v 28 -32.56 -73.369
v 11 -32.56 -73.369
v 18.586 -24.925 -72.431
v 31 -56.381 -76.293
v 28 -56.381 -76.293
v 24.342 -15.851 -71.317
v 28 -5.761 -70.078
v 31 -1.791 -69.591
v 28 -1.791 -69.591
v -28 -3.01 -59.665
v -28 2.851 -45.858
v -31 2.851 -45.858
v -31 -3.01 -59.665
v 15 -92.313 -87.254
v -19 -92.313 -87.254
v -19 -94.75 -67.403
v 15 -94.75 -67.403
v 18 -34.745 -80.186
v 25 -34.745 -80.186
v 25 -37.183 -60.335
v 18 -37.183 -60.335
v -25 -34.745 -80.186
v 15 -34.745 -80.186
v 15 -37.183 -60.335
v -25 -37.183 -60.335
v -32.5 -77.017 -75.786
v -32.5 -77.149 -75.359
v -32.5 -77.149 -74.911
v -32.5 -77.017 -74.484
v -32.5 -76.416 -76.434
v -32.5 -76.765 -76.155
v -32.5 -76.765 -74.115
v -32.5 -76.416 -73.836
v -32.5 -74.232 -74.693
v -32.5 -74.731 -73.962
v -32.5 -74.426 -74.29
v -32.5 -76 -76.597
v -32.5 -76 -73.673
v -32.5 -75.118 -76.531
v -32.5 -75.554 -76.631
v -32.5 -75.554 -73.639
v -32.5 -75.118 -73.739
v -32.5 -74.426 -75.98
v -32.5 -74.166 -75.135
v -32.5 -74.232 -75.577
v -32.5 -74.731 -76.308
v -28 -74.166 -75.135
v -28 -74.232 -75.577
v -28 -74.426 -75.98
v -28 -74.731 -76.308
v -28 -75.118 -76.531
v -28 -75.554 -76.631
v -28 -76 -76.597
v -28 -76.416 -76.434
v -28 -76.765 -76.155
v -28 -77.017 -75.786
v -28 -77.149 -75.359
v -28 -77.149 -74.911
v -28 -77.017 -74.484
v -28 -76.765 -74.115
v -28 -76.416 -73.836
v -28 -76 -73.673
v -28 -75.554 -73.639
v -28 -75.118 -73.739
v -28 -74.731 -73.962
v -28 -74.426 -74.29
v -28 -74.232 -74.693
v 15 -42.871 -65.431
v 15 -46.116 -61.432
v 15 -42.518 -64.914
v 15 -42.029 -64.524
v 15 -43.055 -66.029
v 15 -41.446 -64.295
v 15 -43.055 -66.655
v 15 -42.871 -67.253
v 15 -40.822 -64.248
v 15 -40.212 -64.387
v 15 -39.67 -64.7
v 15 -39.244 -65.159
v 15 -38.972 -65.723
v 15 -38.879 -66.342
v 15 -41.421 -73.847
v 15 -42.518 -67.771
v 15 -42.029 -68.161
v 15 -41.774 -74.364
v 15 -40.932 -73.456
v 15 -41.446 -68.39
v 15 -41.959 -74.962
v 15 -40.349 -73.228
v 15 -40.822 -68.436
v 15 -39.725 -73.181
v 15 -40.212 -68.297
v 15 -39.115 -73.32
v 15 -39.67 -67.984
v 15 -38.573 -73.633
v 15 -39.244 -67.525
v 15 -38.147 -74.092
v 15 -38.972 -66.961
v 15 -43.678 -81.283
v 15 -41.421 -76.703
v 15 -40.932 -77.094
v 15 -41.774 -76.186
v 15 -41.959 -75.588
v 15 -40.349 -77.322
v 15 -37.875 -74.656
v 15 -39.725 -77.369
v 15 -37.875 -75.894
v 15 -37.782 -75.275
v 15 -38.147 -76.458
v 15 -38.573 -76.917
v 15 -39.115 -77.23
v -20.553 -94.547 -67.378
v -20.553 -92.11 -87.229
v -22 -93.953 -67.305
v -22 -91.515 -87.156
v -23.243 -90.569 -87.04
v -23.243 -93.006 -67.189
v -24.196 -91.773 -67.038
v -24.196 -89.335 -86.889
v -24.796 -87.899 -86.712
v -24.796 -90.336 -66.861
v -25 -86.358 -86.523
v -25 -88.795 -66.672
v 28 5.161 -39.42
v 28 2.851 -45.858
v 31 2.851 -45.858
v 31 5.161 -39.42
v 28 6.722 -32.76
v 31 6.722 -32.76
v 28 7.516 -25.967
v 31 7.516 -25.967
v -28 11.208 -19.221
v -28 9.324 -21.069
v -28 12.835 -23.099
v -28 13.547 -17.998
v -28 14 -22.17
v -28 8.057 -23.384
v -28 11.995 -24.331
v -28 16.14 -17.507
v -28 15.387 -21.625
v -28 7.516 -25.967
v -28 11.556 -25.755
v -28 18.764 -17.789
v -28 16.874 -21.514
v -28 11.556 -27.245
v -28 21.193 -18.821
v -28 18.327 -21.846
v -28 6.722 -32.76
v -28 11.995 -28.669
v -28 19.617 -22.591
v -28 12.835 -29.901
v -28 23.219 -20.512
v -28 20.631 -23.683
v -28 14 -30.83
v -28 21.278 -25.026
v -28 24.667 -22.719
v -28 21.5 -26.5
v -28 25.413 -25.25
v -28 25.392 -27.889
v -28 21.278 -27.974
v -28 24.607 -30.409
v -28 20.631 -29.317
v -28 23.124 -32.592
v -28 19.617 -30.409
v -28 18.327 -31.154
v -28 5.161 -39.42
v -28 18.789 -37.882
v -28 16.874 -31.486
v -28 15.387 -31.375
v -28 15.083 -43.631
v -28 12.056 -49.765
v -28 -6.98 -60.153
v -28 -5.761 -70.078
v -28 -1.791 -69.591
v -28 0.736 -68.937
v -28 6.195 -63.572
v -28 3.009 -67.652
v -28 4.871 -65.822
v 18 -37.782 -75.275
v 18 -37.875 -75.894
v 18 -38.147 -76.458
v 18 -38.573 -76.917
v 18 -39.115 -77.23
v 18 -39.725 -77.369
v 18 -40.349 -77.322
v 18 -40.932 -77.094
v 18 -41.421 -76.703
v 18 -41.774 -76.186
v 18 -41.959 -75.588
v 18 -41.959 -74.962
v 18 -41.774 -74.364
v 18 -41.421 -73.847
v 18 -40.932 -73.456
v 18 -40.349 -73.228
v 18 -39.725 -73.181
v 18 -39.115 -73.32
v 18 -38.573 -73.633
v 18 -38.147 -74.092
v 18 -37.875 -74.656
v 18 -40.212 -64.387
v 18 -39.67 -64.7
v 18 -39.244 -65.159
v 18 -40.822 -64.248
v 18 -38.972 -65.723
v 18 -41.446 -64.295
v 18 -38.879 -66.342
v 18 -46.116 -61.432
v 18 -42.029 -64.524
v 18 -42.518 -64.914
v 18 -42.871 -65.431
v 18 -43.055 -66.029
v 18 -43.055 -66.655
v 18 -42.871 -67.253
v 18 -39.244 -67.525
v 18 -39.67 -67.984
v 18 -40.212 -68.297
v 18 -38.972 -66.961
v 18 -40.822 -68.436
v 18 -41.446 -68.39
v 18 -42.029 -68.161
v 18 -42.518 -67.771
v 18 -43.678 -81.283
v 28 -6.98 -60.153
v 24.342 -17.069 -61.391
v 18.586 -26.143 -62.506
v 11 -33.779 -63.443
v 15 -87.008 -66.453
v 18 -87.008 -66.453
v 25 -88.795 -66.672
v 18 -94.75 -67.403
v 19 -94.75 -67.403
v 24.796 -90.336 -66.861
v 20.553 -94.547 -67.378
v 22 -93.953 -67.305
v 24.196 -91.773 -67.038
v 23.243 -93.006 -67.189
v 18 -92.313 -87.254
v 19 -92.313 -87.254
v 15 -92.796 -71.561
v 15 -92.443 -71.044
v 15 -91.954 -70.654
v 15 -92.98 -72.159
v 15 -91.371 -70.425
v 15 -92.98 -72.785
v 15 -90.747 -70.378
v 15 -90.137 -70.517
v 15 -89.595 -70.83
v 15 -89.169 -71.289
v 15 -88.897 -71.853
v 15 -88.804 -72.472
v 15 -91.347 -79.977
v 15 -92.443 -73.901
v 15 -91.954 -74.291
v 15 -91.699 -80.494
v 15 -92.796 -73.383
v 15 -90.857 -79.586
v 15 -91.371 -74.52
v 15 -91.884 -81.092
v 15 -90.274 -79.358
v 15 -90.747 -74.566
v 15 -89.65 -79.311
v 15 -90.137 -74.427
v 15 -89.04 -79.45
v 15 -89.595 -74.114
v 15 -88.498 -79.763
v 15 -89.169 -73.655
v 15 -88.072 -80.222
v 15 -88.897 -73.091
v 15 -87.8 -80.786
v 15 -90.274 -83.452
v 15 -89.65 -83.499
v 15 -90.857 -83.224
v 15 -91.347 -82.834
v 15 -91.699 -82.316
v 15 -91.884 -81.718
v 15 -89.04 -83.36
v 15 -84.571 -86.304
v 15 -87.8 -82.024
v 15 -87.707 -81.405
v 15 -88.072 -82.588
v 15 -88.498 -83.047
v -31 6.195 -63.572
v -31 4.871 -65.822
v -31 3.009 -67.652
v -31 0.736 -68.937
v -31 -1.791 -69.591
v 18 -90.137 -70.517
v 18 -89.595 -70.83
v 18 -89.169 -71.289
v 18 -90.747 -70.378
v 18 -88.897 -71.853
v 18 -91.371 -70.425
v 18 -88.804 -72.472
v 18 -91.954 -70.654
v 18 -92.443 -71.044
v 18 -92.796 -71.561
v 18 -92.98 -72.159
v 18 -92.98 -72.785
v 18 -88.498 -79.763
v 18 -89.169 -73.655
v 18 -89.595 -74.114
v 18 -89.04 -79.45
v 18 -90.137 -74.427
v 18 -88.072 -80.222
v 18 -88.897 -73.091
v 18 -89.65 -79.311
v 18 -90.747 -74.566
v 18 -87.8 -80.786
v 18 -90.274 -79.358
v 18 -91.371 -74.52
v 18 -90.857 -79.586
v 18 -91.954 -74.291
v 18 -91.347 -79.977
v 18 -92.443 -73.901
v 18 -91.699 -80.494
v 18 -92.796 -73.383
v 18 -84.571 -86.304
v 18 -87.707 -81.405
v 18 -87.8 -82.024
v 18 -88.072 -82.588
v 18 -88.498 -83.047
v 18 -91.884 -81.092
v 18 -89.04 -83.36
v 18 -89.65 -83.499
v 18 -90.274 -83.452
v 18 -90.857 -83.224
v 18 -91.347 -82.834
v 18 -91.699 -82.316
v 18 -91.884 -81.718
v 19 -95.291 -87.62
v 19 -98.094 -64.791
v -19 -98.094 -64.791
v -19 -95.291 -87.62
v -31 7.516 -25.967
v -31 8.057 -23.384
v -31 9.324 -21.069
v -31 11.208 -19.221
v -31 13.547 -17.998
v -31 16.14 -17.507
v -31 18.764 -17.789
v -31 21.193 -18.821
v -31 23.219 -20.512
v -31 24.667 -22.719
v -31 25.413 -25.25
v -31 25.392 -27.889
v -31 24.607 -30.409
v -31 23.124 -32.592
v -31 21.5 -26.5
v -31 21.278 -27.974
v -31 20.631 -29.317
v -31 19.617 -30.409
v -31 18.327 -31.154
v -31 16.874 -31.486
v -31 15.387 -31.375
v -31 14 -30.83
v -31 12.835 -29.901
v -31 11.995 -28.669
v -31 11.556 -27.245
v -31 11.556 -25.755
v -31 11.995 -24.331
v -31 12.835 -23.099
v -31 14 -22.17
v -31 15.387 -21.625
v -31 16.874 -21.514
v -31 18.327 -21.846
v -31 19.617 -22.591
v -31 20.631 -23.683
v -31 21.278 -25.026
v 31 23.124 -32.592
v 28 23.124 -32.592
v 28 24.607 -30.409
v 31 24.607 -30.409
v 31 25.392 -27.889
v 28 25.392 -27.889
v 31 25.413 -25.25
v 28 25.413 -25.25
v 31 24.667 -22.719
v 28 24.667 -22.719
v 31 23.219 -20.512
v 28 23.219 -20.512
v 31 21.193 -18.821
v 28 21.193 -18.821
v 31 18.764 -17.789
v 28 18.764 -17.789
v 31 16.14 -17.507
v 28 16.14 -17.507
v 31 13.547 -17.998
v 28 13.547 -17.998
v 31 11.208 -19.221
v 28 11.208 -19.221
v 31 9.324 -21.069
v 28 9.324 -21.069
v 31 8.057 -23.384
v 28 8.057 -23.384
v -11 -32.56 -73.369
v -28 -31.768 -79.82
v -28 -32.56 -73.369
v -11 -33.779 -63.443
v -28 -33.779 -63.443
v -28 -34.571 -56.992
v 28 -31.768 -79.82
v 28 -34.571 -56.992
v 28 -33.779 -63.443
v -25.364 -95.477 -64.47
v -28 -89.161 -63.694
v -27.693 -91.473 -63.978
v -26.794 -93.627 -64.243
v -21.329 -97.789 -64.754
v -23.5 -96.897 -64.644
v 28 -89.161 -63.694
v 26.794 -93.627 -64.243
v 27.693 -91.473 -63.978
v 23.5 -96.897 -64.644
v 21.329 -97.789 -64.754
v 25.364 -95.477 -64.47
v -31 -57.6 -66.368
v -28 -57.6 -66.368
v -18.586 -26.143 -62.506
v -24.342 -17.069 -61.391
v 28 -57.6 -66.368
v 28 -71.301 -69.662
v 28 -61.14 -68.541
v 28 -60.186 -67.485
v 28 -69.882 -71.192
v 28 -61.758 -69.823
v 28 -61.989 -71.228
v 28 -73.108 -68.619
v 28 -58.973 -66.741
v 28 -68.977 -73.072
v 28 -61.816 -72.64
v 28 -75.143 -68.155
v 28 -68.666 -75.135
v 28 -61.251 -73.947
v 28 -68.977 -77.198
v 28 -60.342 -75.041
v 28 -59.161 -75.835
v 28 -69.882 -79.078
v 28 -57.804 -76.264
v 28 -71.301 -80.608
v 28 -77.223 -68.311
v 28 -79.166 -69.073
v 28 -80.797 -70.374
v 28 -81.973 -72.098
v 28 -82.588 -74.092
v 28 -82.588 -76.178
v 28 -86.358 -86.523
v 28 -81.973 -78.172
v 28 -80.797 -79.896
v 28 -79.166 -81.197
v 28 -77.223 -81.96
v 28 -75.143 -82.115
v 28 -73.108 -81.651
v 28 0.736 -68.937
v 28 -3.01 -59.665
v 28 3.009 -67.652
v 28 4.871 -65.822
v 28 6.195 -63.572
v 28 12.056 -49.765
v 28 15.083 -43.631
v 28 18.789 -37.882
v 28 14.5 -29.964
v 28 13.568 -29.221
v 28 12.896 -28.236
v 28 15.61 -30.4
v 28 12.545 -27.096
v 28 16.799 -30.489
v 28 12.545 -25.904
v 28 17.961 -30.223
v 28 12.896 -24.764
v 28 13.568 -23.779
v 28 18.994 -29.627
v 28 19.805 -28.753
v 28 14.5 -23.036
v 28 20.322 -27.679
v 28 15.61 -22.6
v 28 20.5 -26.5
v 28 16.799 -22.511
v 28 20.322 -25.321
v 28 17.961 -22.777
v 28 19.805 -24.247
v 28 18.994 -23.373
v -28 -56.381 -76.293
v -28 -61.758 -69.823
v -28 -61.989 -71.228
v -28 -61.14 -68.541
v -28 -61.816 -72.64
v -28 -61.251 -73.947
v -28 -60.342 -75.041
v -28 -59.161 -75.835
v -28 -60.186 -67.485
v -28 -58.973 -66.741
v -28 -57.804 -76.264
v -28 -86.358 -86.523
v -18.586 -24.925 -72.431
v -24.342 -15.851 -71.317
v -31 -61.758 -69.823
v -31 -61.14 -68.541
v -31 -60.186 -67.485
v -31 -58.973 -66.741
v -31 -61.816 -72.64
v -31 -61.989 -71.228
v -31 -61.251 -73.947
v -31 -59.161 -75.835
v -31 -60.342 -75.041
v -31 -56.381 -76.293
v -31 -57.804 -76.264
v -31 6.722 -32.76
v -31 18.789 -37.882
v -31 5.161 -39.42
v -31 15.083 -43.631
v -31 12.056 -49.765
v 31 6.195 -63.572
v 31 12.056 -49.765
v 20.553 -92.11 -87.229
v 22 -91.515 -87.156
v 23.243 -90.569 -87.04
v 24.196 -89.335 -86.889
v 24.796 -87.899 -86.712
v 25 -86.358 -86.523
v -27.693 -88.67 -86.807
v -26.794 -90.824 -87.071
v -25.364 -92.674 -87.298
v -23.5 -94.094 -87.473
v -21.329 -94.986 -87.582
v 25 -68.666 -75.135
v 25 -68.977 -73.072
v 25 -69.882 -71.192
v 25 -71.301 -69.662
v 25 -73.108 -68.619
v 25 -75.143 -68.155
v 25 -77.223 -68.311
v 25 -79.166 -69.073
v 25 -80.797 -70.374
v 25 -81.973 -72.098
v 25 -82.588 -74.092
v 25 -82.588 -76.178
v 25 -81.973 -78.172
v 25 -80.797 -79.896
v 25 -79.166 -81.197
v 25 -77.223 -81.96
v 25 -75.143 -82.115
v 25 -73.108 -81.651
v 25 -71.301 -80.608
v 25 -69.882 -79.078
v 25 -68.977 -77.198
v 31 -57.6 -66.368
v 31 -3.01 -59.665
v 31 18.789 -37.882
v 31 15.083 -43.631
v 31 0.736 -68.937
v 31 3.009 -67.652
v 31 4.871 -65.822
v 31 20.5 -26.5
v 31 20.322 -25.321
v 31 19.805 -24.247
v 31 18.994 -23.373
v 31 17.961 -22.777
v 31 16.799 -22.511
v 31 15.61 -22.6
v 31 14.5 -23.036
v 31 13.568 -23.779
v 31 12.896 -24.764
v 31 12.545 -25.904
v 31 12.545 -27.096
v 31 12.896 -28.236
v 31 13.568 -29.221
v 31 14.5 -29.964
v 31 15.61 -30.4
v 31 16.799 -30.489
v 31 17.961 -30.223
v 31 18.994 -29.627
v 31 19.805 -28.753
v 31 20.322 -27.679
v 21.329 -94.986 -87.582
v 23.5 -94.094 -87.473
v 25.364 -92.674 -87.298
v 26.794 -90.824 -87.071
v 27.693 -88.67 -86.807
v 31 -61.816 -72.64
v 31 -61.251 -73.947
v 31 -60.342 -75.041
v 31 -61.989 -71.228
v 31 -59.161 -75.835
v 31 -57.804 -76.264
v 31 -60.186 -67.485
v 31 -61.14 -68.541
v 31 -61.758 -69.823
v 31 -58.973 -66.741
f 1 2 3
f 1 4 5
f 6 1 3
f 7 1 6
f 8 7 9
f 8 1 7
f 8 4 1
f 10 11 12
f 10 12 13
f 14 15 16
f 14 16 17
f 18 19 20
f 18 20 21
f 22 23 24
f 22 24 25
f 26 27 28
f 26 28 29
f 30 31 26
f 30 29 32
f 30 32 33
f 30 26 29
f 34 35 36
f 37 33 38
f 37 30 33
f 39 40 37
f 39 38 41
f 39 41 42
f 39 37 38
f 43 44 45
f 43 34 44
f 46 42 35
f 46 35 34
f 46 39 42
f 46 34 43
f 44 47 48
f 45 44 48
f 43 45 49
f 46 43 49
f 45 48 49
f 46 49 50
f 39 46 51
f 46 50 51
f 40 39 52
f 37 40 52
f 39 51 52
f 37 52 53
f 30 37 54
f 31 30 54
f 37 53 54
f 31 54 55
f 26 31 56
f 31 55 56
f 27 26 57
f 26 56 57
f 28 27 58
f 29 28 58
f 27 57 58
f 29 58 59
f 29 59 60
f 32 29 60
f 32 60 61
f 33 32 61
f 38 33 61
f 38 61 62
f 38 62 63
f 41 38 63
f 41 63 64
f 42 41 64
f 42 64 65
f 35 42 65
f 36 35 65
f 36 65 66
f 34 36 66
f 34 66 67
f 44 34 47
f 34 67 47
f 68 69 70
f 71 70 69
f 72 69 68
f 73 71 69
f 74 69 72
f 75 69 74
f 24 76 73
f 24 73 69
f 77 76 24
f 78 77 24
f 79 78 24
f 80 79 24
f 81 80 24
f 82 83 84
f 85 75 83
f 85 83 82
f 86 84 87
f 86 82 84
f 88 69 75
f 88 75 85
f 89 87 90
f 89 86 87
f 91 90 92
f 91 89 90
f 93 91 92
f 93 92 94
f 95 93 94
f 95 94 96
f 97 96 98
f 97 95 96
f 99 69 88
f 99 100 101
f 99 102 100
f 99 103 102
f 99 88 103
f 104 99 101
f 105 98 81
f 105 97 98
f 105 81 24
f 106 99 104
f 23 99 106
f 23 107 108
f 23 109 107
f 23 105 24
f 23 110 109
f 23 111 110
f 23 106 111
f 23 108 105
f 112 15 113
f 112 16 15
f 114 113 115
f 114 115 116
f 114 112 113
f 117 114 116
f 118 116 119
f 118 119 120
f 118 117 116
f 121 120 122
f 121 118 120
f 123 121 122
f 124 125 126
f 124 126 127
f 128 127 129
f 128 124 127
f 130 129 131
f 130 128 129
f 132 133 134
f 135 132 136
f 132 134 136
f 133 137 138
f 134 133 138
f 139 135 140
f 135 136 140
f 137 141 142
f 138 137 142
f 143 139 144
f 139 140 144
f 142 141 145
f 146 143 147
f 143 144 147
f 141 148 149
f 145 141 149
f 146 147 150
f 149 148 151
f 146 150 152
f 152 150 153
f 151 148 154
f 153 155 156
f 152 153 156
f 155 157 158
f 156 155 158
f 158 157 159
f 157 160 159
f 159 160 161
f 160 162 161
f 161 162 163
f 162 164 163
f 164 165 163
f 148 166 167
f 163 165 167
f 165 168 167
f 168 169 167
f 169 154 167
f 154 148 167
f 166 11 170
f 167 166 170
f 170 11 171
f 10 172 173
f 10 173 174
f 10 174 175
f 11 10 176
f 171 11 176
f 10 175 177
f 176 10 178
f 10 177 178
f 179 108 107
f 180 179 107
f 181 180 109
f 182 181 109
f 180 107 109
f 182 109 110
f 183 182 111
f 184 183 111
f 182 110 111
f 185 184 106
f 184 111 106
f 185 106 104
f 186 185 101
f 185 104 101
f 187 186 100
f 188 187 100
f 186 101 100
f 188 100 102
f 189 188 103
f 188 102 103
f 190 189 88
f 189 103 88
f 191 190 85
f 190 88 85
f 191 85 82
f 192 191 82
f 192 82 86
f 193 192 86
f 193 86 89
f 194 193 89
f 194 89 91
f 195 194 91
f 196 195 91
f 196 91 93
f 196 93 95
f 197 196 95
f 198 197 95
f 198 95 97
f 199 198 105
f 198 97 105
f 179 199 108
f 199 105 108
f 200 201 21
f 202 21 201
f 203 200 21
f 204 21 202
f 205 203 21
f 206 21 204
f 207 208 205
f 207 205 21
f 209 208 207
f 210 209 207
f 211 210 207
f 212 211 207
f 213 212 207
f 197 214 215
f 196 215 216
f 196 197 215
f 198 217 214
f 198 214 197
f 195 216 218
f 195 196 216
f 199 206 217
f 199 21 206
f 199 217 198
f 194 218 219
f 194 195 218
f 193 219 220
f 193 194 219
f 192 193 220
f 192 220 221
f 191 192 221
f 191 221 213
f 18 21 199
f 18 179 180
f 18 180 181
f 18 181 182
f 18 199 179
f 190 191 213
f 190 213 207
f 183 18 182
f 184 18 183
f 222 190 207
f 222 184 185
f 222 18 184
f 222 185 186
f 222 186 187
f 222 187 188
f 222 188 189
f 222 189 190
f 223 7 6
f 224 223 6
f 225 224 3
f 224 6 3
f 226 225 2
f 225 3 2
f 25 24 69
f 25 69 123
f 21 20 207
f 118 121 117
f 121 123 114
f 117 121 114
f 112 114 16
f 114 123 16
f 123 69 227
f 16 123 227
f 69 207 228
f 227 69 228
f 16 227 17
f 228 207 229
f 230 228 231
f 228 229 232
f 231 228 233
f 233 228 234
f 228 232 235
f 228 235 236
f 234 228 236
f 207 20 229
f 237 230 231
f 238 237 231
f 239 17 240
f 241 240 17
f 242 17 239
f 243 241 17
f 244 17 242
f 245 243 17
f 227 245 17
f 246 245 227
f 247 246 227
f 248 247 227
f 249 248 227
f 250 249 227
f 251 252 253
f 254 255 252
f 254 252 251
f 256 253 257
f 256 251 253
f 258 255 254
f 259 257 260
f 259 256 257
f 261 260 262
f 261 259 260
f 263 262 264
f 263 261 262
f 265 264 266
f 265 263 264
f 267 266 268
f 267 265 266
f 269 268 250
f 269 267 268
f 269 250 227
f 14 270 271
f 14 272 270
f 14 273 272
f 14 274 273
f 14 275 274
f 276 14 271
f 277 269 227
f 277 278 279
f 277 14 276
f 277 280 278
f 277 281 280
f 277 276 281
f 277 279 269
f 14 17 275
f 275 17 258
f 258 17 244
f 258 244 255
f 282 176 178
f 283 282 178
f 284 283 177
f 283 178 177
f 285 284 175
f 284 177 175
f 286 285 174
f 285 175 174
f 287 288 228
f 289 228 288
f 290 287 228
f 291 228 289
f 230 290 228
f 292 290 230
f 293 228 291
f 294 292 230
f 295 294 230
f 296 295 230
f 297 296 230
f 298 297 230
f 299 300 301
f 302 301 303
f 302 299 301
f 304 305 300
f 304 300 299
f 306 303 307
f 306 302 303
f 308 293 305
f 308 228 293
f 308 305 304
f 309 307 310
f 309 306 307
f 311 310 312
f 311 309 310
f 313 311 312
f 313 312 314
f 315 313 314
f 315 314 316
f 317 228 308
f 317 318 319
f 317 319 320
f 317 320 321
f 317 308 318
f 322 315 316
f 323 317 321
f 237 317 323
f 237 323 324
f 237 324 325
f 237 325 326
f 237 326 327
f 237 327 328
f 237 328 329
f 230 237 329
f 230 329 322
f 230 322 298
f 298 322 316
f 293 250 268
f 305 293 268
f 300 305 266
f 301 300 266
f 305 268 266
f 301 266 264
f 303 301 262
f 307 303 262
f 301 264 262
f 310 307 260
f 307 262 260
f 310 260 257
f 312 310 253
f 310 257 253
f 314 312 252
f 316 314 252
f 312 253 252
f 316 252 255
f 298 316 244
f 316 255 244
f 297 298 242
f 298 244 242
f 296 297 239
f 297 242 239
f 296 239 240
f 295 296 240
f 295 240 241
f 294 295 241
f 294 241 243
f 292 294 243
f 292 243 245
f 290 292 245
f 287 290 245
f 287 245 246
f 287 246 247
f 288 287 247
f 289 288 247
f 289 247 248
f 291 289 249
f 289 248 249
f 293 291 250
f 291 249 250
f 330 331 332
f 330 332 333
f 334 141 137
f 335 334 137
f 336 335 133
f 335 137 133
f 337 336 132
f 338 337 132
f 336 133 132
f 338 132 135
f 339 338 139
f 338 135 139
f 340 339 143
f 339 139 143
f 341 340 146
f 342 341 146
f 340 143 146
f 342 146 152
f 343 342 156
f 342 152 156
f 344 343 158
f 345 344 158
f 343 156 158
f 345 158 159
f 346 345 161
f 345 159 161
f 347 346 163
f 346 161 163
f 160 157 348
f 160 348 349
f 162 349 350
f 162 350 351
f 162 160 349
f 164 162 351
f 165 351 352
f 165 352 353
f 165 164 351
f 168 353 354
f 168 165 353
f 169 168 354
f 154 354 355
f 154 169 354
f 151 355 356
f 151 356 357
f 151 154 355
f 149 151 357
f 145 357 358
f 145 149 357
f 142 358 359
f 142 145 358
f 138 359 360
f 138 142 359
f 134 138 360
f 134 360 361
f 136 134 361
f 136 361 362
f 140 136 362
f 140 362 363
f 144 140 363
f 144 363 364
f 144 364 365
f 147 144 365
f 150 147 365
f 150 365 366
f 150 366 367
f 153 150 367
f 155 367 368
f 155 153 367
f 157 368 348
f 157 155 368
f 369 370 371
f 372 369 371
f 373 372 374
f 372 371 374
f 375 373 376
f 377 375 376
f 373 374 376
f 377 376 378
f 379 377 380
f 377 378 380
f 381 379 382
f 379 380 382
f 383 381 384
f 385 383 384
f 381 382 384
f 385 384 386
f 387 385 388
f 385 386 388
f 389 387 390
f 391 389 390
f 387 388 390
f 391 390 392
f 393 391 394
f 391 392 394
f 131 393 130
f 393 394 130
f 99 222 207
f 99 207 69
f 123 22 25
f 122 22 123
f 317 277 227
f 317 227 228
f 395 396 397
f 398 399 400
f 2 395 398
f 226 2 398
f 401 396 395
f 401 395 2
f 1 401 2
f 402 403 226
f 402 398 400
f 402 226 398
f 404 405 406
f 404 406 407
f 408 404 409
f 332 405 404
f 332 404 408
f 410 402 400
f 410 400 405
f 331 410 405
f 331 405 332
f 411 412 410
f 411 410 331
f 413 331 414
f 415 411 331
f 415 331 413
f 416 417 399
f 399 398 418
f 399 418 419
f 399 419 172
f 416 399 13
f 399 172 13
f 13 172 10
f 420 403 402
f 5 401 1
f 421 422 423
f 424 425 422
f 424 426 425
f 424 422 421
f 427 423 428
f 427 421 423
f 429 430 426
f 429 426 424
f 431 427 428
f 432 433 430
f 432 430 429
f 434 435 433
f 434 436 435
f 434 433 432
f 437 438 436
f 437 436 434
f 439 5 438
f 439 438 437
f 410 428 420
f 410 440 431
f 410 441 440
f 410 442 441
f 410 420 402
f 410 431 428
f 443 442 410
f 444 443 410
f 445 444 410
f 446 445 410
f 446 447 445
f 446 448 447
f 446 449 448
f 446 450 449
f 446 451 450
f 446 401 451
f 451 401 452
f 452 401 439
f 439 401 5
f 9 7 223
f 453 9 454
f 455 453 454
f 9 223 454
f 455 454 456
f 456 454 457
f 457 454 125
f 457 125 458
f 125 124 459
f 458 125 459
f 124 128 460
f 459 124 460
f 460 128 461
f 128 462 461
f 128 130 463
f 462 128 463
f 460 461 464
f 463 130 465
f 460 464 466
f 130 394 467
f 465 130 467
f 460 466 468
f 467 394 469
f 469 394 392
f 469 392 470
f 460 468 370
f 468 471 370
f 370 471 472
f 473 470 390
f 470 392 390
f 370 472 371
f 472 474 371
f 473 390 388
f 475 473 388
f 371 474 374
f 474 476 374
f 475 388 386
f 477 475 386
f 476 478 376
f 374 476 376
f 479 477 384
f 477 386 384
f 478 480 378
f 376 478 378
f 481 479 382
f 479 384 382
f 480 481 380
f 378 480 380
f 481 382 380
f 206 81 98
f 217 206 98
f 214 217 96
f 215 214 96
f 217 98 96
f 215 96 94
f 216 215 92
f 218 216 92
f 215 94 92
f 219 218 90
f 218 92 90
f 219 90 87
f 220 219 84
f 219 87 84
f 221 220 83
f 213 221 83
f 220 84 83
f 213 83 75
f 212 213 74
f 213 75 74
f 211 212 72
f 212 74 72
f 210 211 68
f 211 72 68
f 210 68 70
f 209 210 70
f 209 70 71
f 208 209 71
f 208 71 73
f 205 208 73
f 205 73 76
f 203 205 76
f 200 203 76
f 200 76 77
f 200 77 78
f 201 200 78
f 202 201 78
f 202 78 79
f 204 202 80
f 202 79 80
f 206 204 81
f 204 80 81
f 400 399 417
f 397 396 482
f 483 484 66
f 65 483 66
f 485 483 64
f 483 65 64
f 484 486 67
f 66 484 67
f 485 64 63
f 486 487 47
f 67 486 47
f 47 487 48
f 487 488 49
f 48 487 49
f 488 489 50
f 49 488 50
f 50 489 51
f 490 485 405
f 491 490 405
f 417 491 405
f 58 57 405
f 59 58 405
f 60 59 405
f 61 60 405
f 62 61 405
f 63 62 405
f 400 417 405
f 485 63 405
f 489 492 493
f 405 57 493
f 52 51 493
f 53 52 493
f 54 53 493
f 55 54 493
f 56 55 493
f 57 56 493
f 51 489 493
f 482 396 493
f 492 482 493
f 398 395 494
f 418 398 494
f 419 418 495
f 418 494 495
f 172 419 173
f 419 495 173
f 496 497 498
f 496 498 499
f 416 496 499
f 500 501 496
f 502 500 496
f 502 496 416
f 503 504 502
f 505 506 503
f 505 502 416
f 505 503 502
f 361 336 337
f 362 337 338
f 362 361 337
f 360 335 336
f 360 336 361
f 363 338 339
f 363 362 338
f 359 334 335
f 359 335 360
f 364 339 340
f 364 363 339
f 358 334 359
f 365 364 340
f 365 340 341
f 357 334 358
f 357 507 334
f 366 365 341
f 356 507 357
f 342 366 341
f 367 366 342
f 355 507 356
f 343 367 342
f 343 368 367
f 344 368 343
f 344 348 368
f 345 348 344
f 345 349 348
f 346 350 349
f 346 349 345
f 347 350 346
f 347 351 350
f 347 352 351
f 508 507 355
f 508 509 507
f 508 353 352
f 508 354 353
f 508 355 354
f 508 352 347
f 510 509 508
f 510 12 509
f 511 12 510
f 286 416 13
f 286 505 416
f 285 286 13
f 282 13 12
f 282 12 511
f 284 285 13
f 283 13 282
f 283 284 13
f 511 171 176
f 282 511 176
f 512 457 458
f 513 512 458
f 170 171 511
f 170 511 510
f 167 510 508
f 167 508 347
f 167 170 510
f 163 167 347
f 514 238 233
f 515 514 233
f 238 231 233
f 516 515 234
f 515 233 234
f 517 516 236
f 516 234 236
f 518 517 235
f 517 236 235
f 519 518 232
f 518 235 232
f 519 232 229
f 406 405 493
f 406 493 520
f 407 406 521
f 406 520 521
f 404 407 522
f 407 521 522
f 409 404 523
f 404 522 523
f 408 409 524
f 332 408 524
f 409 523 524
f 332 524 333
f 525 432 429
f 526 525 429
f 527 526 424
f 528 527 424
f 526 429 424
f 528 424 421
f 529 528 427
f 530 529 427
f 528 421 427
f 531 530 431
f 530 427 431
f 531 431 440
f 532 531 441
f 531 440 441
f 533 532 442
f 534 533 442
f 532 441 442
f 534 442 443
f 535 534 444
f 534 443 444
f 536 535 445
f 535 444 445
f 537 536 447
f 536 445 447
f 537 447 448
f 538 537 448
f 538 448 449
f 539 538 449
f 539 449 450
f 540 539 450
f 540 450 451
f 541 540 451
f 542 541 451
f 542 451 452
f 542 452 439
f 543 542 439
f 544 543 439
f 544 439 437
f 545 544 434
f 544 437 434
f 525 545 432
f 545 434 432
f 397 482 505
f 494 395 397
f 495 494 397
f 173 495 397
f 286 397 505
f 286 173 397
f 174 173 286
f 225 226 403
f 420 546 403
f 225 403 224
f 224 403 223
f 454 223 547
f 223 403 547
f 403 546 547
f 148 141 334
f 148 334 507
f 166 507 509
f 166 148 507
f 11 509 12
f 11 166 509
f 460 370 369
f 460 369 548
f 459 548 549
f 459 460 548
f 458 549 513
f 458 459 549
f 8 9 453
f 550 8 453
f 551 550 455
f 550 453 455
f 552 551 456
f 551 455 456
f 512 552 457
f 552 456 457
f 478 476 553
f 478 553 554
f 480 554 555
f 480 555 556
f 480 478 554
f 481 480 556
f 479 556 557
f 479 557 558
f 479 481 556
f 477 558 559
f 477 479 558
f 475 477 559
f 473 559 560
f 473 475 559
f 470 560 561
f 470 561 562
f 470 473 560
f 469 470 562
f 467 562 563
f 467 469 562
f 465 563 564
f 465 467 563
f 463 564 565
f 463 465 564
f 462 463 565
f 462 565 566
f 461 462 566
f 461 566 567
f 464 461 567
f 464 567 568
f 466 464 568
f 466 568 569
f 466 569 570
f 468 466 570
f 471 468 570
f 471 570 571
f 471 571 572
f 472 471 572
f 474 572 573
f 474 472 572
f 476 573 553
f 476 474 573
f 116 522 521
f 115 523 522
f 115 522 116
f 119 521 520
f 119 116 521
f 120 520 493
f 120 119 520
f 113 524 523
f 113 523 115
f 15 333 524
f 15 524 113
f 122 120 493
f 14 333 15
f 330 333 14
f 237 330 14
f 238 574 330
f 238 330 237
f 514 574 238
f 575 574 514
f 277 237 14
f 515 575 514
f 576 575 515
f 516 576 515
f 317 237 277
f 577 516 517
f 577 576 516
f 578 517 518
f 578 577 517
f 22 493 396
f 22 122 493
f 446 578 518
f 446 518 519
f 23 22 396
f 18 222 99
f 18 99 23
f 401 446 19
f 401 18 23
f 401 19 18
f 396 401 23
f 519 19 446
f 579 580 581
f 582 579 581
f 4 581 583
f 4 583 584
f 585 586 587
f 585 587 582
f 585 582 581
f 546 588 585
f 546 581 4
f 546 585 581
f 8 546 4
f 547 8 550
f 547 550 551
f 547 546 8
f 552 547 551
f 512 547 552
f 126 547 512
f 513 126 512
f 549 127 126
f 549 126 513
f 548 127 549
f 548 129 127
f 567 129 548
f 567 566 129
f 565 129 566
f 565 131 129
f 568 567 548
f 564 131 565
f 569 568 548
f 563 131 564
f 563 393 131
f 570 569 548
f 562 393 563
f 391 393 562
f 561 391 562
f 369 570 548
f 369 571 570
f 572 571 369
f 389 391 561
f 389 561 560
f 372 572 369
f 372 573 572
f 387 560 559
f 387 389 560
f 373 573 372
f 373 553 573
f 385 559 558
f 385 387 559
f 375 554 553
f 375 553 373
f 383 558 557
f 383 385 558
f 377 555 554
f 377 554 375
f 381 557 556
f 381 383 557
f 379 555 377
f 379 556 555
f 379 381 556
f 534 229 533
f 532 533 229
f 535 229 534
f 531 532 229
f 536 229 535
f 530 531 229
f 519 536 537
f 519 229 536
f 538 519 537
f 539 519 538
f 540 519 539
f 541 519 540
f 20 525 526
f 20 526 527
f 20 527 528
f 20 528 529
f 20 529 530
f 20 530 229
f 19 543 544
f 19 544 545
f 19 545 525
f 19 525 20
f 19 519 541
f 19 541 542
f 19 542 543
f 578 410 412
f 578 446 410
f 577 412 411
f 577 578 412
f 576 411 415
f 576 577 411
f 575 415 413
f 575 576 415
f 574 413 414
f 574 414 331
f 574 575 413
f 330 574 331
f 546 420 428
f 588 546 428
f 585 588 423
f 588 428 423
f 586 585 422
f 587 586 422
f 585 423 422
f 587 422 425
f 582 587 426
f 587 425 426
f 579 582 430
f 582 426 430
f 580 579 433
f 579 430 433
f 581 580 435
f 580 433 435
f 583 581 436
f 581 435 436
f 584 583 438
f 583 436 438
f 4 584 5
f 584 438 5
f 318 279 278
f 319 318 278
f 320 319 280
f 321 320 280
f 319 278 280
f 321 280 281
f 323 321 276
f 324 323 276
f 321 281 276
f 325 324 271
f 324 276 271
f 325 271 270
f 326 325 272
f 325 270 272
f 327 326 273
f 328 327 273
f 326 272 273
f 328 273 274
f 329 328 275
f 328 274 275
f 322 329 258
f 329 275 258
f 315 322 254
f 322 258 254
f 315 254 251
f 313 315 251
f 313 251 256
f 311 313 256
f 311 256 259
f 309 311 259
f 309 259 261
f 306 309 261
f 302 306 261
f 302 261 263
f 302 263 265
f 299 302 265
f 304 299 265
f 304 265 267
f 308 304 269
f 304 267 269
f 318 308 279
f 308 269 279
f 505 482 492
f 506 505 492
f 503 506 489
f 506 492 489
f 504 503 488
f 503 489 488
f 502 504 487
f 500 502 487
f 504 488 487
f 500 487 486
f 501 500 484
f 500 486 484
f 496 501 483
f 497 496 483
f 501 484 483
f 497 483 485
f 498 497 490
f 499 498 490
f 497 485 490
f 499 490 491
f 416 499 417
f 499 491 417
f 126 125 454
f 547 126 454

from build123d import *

# Parameters (mm, degrees)
SKETCH012_R     = 4
PAD005_DEPTH    = 3
PAD006_DEPTH    = 56
POCKET007_DEPTH = 20
SKETCH016_R     = 7
POCKET008_DEPTH = 3
SKETCH018_R     = 2.1
POCKET010_DEPTH = 3
SKETCH019_R     = 5
PAD007_DEPTH    = 3
SKETCH020_R     = 1.5
PAD008_DEPTH    = 4.5
PAD009_DEPTH    = 10
FILLET_R        = 9
FILLET001_R     = 6


with BuildPart() as part:
    # Sketch012 → Pad005 (new body)
    with BuildSketch(Plane.YZ):
        with BuildLine():
            Line((-13.6486038997, -19.3575724611), (-19.5095708271, -33.1651452629))
            Line((-19.5095708271, -33.1651452629), (-74.0996091673, -39.8679591502))
            ThreePointArc((-74.0996091673, -39.8679591502), (-78.4529932085, -45.4400366254), (-72.8809157334, -49.7934206666))
            Line((-72.8809157334, -49.7934206666), (-18.2908773931, -43.0906067793))
            ThreePointArc((-18.2908773931, -43.0906067793), (-13.4914205956, -41.1515003634), (-10.3045222925, -37.0724565478))
            Line((-10.3045222925, -37.0724565478), (-4.4435553652, -23.264883746))
            ThreePointArc((6.6243568489, -6.092445842), (0.3541186357, -14.2041191435), (-4.4435553652, -23.264883746))
            ThreePointArc((6.6243568489, -6.092445842), (3.5165801564, 8.2845436811), (-8.9842037096, 0.5329950324))
            ThreePointArc((-13.6486038997, -19.3575724611), (-10.4635797031, -9.6122786293), (-8.9842037096, 0.5329950324))
        make_face()
        Circle(SKETCH012_R, mode=Mode.SUBTRACT)
    extrude(amount=PAD005_DEPTH)

    # Sketch013 (on Face11 of Pad005) → Pad006 (join)
    with BuildSketch(Plane(origin=(0, 0, 0), x_dir=(0, 1, 0), z_dir=(-1, 0, 0))):
        Polygon((-111.7906110668, 61.1197443885), (-48.2676573618, 53.3201064106), (-51.0706522601, 30.4915449228), (-114.5936059651, 38.2911829007), align=None)
    extrude(amount=PAD006_DEPTH)

    # Sketch015 (on Face15 of Pad006) → Pocket007 (cut)
    with BuildSketch(Plane(origin=(0, 5.7327727551, -46.6896873101), x_dir=(0, 0.9925461516, 0.1218693434), z_dir=(0, 0.1218693434, -0.9925461516))):
        Polygon((-115.4059639217, -3), (-57.4059639217, -3), (-57.4059639217, -10), (-66.4059639217, -10), (-66.4059639217, -13), (-57.4059639217, -13), (-57.4059639217, -53), (-115.4059639217, -53), (-115.4059639217, -13), (-107.6059639217, -13), (-107.6059639217, -10), (-115.4059639217, -10), align=None)
    extrude(amount=-POCKET007_DEPTH, mode=Mode.SUBTRACT)

    # Sketch016 (on Face14 of Pocket007) → Pocket008 (cut)
    with BuildSketch(Plane.YZ):
        with Locations((-92.1658353164, -48.6350266606)):
            Circle(SKETCH016_R)
    extrude(amount=-POCKET008_DEPTH, mode=Mode.SUBTRACT)

    # Sketch018 → Pocket010 (cut)
    with BuildSketch(Plane(origin=(-13, 0, 0), x_dir=(0, 1, 0), z_dir=(-1, 0, 0))):
        with Locations((-57.4788589785, 39.8422072873)):
            Circle(SKETCH018_R)
        with Locations((-56.3820348878, 48.7751226521)):
            Circle(SKETCH018_R)
        with Locations((-107.403930406, 45.9722352606)):
            Circle(SKETCH018_R)
        with Locations((-106.3071063154, 54.9051506254)):
            Circle(SKETCH018_R)
    extrude(amount=-POCKET010_DEPTH, mode=Mode.SUBTRACT)

    # Sketch019 → Pad007 (join)
    with BuildSketch(Plane(origin=(-56, 0, 0), x_dir=(0, 1, 0), z_dir=(-1, 0, 0))):
        with BuildLine():
            ThreePointArc((-8.9842037096, -0.5329950324), (3.5165801564, -8.2845436811), (6.6243568489, 6.092445842))
            ThreePointArc((-4.4435553652, 23.264883746), (0.3541186357, 14.2041191435), (6.6243568489, 6.092445842))
            Line((-4.4435553652, 23.264883746), (-10.3045222925, 37.0724565478))
            ThreePointArc((-10.3045222925, 37.0724565478), (-13.4914205956, 41.1515003634), (-18.290877393, 43.0906067793))
            Line((-18.290877393, 43.0906067793), (-72.8809157333, 49.7934206666))
            ThreePointArc((-72.8809157333, 49.7934206666), (-78.4529932085, 45.4400366254), (-74.0996091673, 39.8679591502))
            Line((-19.5095708271, 33.1651452629), (-74.0996091673, 39.8679591502))
            Line((-13.6486038997, 19.3575724611), (-19.5095708271, 33.1651452629))
            ThreePointArc((-8.9842037096, -0.5329950324), (-10.4635797031, 9.6122786293), (-13.6486038997, 19.3575724611))
        make_face()
        Circle(SKETCH019_R, mode=Mode.SUBTRACT)
    extrude(amount=PAD007_DEPTH)

    # Sketch020 (on Face17 of Pad007) → Pad008 (join)
    with BuildSketch(Plane(origin=(-56, 0, 0), x_dir=(0, 1, 0), z_dir=(-1, 0, 0))):
        with Locations((-92.1658353164, 48.6350266606)):
            Circle(SKETCH020_R)
    extrude(amount=PAD008_DEPTH)

    # Sketch021 (on Face9 of Pad008) → Pad009 (join)
    with BuildSketch(Plane(origin=(0, 4.9406220229, -40.2381373244), x_dir=(0, 0.9925461516, 0.1218693434), z_dir=(0, 0.1218693434, -0.9925461516))):
        with BuildLine():
            Line((-27.4059639217, 0), (-54.4059639217, 0))
            Line((-54.4059639217, 0), (-54.4059639217, -17))
            ThreePointArc((-27.4059639217, 0), (-42.2983611114, -6.2885456399), (-54.4059639217, -17))
        make_face()
        with BuildLine():
            Line((-54.4059639217, -39), (-54.4059639217, -56))
            Line((-27.4059639217, -56), (-54.4059639217, -56))
            ThreePointArc((-54.4059639217, -39), (-42.2983611114, -49.7114543601), (-27.4059639217, -56))
        make_face()
    extrude(amount=-PAD009_DEPTH)

    # Fillet
    fillet_edges = [part.edges().sort_by_distance(p)[0] for p in [
        (0, -113.192109, -49.705464),
        (-56, -113.192109, -49.705464),
    ]]
    fillet(fillet_edges, radius=FILLET_R)

    # Fillet001
    fillet001_edges = [part.edges().sort_by_distance(p)[0] for p in [
        (-53, -110.031666, -50.828675),
        (-3, -110.031666, -50.828675),
    ]]
    fillet(fillet001_edges, radius=FILLET001_R)


with BuildPart() as part_1:
    # Body004 placement: moved
    add(part.part.moved(Location((28, 16.5, -26.5))))


solid = part_1.part
